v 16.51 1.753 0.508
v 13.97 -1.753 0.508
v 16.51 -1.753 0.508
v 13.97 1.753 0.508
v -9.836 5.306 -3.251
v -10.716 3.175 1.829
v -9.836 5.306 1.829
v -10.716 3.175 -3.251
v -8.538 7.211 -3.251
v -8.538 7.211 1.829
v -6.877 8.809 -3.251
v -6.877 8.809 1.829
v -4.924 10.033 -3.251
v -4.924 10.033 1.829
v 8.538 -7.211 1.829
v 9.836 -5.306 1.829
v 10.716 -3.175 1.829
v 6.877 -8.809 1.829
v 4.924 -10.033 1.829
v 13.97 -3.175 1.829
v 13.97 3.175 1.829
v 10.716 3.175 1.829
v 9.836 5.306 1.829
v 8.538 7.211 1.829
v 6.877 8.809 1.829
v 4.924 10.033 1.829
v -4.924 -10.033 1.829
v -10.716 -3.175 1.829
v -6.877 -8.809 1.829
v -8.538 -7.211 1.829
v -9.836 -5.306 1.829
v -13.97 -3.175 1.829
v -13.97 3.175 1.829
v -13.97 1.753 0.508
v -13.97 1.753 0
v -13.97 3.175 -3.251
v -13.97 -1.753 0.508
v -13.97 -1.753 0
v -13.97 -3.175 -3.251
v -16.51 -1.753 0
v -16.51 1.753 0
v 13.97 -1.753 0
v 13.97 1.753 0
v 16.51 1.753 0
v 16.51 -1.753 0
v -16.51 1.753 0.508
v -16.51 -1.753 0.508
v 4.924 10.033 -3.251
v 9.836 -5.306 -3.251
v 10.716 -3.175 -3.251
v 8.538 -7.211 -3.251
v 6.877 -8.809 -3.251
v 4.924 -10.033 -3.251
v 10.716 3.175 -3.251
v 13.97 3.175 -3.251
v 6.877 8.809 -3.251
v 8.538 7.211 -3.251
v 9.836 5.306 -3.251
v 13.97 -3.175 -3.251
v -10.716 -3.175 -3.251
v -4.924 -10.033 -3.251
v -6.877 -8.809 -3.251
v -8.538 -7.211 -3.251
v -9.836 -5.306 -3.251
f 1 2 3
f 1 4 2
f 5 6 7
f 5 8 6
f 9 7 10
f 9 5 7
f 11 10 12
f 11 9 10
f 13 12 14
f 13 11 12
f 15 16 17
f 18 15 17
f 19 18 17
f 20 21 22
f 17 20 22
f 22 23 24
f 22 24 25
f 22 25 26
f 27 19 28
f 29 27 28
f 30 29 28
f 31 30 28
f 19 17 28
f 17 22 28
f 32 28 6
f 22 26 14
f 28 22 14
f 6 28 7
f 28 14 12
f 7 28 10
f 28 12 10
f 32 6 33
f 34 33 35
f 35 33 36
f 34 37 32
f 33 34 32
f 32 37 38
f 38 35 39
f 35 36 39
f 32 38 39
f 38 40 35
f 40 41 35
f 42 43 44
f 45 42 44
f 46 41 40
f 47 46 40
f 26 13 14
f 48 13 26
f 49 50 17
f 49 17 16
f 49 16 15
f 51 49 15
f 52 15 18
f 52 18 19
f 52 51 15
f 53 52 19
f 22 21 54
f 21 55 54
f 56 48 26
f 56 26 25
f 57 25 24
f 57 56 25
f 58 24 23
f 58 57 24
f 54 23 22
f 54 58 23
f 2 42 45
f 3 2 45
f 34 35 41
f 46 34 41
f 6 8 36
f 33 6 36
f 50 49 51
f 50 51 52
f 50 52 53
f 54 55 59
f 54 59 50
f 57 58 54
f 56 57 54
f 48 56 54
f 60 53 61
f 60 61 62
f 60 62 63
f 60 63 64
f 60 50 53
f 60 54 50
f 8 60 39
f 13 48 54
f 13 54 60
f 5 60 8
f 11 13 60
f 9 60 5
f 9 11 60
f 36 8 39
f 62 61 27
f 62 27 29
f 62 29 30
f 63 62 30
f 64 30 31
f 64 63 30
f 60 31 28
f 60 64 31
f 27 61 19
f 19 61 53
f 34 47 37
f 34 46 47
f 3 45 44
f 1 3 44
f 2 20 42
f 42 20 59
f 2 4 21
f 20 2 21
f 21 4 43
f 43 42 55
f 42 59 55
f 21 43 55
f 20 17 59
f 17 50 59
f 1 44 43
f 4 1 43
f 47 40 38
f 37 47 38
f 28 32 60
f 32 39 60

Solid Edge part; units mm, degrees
sketch "Sketch1" plane through (0, 0, 0) normal (0, 0, 1) x (1, 0, 0)
  line L0 (-11.43, -1.7526) -> (-11.43, 1.7526)
  line L1 (-11.43, 1.7526) -> (-16.51, 1.7526)
  line L2 (-16.51, 1.7526) -> (-16.51, -1.7526)
  line L3 (-16.51, -1.7526) -> (-11.43, -1.7526)
  line L4 (16.51, 1.7526) -> (11.43, 1.7526)
  line L5 (11.43, 1.7526) -> (11.43, -1.7526)
  line L6 (11.43, -1.7526) -> (16.51, -1.7526)
  line L7 (16.51, -1.7526) -> (16.51, 1.7526)
  dimension "D1" = 33.02
  dimension "D2" = 3.5052
  dimension "D3" = 16.51
  dimension "D4" = 5.08
extrude "Protrusion1" add sketch "Sketch1" along normal blind 0.508
sketch "Sketch2" plane through (0, 0, -3.2512) normal (0, 0, 1) x (1, 0, 0)
  line L0 (-13.97, -3.175) -> (13.97, -3.175)
  line L1 (-13.97, 3.175) -> (-13.97, -3.175)
  line L2 (13.97, 3.175) -> (-13.97, 3.175)
  line L3 (-4.9236, 10.033) -> (4.9236, 10.033)
  arc A0 (4.9236, 10.033) -> (4.9236, -10.033) centre (0, 0) cw
  line L4 (13.97, -3.175) -> (13.97, 3.175)
  line L5 (-4.9236, -10.033) -> (4.9236, -10.033)
  arc A1 (-4.9236, -10.033) -> (-4.9236, 10.033) centre (0, 0) cw
  arc A2 (-4.9236, -10.033) -> (-4.9236, 10.033) centre (0, 0) cw construction
extrude "ExtrudedProtrusion_2" add sketch "Sketch2" along normal blind 5.08
